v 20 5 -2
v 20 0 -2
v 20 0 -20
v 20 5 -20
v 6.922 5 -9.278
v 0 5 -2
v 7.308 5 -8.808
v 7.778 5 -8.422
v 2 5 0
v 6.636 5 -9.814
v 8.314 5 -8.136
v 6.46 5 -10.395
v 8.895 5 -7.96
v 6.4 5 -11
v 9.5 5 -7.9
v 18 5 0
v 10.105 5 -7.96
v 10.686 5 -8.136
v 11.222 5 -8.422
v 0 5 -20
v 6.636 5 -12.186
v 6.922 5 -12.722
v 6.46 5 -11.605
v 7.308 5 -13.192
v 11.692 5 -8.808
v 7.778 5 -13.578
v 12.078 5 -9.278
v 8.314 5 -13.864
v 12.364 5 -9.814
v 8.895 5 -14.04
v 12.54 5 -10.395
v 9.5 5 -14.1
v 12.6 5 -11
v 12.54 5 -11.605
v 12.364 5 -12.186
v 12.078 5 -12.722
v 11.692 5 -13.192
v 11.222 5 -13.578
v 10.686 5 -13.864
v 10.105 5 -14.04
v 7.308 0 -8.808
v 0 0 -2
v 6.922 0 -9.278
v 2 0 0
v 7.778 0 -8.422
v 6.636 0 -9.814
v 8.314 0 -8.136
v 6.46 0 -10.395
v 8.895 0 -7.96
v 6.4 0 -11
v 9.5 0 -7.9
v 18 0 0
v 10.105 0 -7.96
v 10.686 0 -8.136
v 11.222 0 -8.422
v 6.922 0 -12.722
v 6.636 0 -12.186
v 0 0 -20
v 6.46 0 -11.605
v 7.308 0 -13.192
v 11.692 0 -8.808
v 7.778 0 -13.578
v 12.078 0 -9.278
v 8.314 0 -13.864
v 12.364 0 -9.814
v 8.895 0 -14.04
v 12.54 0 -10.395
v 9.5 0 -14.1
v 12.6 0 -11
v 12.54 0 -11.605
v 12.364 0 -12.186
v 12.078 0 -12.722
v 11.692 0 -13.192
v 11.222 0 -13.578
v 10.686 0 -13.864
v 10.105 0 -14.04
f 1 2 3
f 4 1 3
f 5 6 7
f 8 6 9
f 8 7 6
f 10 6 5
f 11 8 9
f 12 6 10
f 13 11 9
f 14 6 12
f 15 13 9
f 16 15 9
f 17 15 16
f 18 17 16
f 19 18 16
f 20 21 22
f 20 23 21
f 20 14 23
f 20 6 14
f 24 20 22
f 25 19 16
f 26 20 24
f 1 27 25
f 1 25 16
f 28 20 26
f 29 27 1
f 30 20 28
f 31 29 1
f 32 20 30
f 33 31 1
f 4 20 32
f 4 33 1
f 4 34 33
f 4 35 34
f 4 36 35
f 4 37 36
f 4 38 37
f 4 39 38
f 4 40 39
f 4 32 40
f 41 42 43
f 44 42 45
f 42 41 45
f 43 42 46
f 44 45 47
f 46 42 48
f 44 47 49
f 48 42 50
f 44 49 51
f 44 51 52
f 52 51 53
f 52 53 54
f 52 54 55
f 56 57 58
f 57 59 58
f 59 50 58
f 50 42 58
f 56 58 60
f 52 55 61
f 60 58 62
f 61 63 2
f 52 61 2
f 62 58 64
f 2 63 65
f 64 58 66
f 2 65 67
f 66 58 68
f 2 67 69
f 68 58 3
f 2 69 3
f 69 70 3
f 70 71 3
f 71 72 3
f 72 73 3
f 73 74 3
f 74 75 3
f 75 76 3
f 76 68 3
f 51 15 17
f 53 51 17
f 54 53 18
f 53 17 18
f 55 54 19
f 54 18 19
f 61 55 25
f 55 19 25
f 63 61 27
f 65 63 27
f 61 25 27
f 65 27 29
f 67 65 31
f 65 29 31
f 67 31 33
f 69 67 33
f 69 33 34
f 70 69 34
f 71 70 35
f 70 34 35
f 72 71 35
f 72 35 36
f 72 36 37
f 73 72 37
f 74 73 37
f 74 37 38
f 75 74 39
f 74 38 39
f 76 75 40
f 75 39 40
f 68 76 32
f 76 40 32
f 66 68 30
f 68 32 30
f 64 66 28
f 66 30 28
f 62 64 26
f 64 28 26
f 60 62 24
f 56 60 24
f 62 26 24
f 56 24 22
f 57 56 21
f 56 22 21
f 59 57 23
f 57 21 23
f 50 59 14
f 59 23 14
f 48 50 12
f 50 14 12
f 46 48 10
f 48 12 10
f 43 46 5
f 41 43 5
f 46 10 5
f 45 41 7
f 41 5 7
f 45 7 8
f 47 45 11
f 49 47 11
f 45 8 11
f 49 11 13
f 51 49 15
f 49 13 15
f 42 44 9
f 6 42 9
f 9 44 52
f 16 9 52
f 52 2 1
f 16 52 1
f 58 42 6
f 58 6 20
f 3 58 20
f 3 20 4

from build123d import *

# Parameters (mm, degrees)
SKETCH_1_W          = 20
SKETCH_1_H          = 20
EXTRUDE_1_DEPTH     = 5
SKETCH_2_R          = 3.1
CUT_EXTRUDE_1_DEPTH = 5
CHAMFER_1_SIZE      = 2


with BuildPart() as part:
    # 스케치1 → 보스-돌출1 (new body)
    with BuildSketch(Plane(origin=(0, 0, 0), x_dir=(1, 0, 0), z_dir=(0, 1, 0))):
        with Locations((10, 10)):
            Rectangle(SKETCH_1_W, SKETCH_1_H)
    extrude(amount=EXTRUDE_1_DEPTH)

    # 스케치2 → 컷-돌출1 (cut)
    with BuildSketch(Plane(origin=(0, 5, 0), x_dir=(1, 0, 0), z_dir=(0, 1, 0))):
        with Locations(Location((9.5, 11, 0), (0, 0, 270))):
            Circle(SKETCH_2_R)
    extrude(amount=-CUT_EXTRUDE_1_DEPTH, mode=Mode.SUBTRACT)

    # 모따기1
    chamfer_1_edges = [part.edges().sort_by_distance(p)[0] for p in [
        (20, 2.5, 0),
        (0, 2.5, 0),
    ]]
    chamfer(chamfer_1_edges, length=CHAMFER_1_SIZE)


solid = part.part
